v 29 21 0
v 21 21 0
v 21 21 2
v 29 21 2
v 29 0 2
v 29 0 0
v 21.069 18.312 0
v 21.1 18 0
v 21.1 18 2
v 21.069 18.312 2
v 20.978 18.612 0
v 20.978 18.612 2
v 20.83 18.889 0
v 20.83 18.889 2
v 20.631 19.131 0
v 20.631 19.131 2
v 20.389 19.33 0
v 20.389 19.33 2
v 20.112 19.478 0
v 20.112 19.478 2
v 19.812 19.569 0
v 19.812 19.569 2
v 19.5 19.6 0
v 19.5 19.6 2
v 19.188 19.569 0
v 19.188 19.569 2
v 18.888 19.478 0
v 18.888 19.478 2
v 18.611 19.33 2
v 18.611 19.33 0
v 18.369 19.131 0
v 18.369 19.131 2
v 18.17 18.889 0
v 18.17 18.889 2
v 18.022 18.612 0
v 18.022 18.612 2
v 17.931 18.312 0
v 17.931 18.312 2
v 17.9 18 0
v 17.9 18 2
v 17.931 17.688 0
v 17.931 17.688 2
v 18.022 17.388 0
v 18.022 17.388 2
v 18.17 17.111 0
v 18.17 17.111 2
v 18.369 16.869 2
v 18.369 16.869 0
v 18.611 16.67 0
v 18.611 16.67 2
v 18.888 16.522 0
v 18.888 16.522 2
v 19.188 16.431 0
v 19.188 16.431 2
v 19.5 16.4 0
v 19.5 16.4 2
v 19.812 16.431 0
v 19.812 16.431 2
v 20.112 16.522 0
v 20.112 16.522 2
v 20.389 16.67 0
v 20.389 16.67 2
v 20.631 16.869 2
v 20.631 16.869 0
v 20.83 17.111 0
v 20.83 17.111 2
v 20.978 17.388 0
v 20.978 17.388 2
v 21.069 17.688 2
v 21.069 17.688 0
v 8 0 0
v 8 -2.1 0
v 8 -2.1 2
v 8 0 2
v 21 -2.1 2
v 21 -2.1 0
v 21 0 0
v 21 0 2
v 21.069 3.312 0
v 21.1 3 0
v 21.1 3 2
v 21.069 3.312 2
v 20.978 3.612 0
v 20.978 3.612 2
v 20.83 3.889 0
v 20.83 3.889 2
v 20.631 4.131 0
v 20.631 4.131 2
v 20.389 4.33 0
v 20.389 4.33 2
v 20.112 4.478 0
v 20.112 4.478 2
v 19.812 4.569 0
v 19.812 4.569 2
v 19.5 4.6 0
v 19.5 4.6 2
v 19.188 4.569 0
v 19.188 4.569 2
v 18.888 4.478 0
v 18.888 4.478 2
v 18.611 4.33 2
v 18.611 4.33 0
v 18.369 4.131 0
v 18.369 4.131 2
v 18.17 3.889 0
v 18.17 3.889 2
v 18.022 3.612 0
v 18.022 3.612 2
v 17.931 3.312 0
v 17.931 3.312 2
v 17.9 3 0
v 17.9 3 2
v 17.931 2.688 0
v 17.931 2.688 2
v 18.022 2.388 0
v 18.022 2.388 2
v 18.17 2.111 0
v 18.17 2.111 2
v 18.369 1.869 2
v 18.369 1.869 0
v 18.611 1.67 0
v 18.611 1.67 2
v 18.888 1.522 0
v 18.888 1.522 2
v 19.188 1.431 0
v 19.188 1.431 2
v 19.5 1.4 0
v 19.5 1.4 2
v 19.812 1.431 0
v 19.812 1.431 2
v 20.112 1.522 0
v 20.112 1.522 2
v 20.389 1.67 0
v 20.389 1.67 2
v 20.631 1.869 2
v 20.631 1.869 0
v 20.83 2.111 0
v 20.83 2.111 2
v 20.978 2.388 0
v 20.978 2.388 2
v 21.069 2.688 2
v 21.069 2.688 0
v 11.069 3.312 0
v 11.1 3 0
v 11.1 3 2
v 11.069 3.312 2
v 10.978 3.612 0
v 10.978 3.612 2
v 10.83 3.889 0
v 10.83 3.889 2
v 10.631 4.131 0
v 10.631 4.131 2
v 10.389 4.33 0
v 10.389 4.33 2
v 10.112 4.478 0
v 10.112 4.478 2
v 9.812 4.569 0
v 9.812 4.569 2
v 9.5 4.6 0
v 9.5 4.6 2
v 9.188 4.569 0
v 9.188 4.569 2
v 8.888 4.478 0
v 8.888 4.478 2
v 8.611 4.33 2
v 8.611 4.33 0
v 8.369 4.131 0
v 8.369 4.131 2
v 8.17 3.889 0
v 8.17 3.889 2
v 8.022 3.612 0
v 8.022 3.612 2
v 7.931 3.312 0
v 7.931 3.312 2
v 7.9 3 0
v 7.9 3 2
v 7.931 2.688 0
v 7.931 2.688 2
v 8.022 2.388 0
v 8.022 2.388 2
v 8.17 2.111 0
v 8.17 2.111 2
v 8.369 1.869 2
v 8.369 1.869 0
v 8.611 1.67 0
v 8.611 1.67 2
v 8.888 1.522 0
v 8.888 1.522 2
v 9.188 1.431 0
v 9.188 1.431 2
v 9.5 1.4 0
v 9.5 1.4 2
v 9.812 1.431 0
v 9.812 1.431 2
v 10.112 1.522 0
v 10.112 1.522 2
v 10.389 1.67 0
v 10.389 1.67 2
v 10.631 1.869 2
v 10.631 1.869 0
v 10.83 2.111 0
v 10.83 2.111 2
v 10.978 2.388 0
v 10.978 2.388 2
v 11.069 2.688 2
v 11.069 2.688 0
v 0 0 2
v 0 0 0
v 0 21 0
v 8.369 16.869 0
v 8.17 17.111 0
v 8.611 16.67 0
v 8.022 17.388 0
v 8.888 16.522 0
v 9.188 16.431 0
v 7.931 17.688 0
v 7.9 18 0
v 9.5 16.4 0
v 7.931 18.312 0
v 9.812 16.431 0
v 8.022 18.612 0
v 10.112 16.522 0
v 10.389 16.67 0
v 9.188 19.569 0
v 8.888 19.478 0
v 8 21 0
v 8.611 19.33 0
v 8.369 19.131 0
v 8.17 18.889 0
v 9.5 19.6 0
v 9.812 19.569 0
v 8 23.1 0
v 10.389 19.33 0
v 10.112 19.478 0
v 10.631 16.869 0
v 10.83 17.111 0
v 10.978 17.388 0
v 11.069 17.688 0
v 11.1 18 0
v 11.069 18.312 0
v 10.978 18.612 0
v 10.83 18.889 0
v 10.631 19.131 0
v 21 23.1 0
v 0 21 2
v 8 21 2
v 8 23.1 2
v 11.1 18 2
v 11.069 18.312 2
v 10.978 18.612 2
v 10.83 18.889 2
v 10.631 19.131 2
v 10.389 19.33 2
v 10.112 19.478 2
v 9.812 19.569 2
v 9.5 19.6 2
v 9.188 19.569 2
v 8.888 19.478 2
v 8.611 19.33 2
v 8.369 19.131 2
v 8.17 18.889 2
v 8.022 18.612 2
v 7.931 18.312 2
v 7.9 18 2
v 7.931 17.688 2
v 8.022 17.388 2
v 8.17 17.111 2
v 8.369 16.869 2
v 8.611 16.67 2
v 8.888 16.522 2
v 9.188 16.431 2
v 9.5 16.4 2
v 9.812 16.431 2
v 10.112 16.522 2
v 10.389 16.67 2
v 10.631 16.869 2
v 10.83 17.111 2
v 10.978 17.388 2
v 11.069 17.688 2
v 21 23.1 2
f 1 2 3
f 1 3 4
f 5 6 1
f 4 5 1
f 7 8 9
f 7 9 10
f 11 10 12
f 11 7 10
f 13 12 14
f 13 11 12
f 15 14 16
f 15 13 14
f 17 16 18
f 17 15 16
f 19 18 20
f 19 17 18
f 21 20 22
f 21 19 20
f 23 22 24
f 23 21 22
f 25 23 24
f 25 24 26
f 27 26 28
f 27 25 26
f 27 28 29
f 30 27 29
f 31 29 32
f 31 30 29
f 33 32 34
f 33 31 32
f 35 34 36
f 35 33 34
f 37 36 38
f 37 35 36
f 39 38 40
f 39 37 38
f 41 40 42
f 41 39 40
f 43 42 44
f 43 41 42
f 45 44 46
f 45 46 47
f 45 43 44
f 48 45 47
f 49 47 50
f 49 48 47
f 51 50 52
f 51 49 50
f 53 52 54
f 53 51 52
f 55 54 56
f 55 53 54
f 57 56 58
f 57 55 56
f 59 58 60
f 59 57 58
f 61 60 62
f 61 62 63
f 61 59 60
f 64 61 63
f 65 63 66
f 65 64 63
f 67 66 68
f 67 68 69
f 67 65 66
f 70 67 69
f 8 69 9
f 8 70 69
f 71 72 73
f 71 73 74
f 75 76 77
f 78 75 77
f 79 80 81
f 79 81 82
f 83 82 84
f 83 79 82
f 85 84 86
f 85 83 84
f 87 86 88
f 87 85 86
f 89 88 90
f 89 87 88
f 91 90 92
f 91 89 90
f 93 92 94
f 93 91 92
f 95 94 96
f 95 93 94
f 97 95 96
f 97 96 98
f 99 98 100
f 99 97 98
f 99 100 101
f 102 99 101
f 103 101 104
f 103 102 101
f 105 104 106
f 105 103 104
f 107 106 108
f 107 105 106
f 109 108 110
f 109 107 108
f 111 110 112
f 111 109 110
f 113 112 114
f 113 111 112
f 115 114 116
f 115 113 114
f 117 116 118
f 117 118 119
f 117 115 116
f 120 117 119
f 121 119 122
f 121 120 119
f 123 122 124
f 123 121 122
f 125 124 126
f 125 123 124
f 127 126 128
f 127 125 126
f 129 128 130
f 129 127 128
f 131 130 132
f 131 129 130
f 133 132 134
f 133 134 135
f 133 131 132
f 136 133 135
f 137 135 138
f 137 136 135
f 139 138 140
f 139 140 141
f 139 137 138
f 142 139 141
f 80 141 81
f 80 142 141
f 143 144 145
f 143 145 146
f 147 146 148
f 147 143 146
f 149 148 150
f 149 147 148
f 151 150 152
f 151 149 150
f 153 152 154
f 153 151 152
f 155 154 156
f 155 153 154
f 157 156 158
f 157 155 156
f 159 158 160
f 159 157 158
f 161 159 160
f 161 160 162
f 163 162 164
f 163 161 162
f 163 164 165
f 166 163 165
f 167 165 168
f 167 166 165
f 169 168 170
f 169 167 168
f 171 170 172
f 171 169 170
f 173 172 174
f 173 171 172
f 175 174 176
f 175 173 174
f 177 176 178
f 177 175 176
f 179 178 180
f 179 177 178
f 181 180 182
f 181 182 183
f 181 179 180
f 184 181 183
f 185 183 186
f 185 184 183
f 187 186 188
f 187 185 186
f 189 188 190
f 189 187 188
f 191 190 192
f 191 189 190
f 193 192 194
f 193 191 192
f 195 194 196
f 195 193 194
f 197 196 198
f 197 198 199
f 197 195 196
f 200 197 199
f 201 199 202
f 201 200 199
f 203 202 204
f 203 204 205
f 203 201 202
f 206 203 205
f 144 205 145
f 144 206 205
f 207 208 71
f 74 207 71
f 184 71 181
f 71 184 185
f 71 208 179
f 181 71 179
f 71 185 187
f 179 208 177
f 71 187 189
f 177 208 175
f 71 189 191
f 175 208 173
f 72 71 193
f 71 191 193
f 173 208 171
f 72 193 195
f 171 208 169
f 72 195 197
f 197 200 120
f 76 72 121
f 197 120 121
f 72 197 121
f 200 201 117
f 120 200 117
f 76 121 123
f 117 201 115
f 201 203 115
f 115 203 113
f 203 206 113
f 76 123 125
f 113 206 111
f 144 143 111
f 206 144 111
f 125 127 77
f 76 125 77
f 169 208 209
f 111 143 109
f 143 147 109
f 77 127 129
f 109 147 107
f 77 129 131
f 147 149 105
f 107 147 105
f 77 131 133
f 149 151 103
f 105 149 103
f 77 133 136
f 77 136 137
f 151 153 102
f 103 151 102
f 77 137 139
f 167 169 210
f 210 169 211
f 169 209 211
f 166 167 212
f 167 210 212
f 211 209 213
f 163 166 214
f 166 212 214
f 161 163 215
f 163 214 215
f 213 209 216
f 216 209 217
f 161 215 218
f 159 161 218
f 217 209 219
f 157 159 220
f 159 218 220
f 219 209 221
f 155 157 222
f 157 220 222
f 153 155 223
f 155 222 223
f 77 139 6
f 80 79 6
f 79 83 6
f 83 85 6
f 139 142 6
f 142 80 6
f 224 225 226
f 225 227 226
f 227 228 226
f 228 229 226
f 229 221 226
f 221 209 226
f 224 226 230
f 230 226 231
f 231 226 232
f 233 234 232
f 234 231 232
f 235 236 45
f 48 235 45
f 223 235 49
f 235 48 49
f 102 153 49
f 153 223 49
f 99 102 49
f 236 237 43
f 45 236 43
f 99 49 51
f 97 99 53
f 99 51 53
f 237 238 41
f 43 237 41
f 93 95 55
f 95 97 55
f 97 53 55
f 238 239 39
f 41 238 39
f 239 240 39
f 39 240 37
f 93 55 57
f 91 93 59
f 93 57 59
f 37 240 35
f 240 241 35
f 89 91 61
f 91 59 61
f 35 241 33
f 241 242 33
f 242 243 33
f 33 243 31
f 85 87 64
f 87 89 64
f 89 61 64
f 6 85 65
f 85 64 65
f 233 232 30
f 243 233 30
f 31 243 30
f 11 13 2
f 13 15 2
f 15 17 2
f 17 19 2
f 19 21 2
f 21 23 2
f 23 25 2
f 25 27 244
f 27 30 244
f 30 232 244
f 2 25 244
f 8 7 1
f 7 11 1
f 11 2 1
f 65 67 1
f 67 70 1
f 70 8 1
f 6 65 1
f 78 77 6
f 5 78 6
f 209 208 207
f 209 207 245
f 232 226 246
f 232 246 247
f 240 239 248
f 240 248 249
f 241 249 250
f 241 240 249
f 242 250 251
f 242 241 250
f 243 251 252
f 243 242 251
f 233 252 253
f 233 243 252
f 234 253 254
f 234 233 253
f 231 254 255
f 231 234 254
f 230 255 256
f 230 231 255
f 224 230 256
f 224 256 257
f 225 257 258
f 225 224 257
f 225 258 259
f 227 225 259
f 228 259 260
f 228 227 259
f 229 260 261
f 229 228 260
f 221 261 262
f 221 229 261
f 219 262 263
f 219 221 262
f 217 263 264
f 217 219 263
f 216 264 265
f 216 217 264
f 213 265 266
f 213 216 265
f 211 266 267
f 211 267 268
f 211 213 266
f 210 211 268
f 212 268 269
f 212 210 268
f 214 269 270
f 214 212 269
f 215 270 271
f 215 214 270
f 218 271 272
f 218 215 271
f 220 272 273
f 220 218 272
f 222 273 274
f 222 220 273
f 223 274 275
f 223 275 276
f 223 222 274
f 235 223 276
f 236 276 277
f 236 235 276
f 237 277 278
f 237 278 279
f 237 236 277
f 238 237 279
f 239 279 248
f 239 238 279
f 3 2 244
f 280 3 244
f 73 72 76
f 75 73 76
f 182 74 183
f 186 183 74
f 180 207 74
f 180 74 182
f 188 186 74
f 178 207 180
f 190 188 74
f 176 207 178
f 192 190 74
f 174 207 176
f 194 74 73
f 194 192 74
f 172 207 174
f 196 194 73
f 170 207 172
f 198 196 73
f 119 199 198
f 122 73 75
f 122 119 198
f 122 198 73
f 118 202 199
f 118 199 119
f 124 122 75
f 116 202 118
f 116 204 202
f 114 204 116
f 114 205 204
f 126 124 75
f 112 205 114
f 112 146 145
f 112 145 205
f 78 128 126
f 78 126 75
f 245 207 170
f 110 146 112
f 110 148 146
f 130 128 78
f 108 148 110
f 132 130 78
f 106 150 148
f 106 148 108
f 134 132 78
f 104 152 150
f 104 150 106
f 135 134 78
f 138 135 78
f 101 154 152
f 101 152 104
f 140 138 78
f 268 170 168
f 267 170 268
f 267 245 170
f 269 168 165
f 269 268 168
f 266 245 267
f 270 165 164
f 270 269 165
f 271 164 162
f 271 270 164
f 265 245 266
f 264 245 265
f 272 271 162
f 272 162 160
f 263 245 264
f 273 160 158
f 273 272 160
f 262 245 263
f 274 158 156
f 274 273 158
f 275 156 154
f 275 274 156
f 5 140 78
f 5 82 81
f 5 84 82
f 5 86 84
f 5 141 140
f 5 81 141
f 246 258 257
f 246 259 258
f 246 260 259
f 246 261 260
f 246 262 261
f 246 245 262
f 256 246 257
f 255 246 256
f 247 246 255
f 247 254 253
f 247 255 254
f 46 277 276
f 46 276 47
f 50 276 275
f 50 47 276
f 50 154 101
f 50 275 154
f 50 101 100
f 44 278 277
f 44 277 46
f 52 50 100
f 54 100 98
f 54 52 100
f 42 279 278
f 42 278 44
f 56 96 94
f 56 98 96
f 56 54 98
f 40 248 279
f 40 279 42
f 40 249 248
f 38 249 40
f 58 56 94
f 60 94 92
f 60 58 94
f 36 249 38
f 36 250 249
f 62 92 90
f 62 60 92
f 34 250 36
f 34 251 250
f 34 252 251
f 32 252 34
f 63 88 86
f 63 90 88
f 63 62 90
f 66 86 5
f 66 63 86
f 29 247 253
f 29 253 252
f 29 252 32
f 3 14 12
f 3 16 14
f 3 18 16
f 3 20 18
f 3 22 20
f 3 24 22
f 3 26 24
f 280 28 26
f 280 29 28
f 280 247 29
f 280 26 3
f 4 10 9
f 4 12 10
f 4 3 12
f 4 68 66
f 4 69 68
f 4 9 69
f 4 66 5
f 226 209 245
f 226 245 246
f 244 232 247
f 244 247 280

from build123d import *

# Parameters (mm, degrees)
SKETCH_1_W      = 29
SKETCH_1_H      = 21
SKETCH_1_R      = 1.6
SKETCH_1_W_2    = 13
SKETCH_1_H_2    = 2.1
EXTRUDE_1_DEPTH = 2


with BuildPart() as part:
    # 草图1 → 凸台-拉伸1 (new body)
    # profile 1 of 3: a face of its own
    with BuildSketch(Plane.XY):
        with Locations((14.5, 10.5)):
            Rectangle(SKETCH_1_W, SKETCH_1_H)
        with Locations((9.5, 18)):
            Circle(SKETCH_1_R, mode=Mode.SUBTRACT)
        with Locations((19.5, 18)):
            Circle(SKETCH_1_R, mode=Mode.SUBTRACT)
        with Locations((9.5, 3)):
            Circle(SKETCH_1_R, mode=Mode.SUBTRACT)
        with Locations((19.5, 3)):
            Circle(SKETCH_1_R, mode=Mode.SUBTRACT)
    # profile 2 of 3: a face of its own
    with BuildSketch(Plane.XY):
        with Locations((14.5, -1.05)):
            Rectangle(SKETCH_1_W_2, SKETCH_1_H_2)
    # profile 3 of 3: a face of its own
    with BuildSketch(Plane.XY):
        with Locations((14.5, 22.05)):
            Rectangle(SKETCH_1_W_2, SKETCH_1_H_2)
    extrude(amount=EXTRUDE_1_DEPTH)


solid = part.part
